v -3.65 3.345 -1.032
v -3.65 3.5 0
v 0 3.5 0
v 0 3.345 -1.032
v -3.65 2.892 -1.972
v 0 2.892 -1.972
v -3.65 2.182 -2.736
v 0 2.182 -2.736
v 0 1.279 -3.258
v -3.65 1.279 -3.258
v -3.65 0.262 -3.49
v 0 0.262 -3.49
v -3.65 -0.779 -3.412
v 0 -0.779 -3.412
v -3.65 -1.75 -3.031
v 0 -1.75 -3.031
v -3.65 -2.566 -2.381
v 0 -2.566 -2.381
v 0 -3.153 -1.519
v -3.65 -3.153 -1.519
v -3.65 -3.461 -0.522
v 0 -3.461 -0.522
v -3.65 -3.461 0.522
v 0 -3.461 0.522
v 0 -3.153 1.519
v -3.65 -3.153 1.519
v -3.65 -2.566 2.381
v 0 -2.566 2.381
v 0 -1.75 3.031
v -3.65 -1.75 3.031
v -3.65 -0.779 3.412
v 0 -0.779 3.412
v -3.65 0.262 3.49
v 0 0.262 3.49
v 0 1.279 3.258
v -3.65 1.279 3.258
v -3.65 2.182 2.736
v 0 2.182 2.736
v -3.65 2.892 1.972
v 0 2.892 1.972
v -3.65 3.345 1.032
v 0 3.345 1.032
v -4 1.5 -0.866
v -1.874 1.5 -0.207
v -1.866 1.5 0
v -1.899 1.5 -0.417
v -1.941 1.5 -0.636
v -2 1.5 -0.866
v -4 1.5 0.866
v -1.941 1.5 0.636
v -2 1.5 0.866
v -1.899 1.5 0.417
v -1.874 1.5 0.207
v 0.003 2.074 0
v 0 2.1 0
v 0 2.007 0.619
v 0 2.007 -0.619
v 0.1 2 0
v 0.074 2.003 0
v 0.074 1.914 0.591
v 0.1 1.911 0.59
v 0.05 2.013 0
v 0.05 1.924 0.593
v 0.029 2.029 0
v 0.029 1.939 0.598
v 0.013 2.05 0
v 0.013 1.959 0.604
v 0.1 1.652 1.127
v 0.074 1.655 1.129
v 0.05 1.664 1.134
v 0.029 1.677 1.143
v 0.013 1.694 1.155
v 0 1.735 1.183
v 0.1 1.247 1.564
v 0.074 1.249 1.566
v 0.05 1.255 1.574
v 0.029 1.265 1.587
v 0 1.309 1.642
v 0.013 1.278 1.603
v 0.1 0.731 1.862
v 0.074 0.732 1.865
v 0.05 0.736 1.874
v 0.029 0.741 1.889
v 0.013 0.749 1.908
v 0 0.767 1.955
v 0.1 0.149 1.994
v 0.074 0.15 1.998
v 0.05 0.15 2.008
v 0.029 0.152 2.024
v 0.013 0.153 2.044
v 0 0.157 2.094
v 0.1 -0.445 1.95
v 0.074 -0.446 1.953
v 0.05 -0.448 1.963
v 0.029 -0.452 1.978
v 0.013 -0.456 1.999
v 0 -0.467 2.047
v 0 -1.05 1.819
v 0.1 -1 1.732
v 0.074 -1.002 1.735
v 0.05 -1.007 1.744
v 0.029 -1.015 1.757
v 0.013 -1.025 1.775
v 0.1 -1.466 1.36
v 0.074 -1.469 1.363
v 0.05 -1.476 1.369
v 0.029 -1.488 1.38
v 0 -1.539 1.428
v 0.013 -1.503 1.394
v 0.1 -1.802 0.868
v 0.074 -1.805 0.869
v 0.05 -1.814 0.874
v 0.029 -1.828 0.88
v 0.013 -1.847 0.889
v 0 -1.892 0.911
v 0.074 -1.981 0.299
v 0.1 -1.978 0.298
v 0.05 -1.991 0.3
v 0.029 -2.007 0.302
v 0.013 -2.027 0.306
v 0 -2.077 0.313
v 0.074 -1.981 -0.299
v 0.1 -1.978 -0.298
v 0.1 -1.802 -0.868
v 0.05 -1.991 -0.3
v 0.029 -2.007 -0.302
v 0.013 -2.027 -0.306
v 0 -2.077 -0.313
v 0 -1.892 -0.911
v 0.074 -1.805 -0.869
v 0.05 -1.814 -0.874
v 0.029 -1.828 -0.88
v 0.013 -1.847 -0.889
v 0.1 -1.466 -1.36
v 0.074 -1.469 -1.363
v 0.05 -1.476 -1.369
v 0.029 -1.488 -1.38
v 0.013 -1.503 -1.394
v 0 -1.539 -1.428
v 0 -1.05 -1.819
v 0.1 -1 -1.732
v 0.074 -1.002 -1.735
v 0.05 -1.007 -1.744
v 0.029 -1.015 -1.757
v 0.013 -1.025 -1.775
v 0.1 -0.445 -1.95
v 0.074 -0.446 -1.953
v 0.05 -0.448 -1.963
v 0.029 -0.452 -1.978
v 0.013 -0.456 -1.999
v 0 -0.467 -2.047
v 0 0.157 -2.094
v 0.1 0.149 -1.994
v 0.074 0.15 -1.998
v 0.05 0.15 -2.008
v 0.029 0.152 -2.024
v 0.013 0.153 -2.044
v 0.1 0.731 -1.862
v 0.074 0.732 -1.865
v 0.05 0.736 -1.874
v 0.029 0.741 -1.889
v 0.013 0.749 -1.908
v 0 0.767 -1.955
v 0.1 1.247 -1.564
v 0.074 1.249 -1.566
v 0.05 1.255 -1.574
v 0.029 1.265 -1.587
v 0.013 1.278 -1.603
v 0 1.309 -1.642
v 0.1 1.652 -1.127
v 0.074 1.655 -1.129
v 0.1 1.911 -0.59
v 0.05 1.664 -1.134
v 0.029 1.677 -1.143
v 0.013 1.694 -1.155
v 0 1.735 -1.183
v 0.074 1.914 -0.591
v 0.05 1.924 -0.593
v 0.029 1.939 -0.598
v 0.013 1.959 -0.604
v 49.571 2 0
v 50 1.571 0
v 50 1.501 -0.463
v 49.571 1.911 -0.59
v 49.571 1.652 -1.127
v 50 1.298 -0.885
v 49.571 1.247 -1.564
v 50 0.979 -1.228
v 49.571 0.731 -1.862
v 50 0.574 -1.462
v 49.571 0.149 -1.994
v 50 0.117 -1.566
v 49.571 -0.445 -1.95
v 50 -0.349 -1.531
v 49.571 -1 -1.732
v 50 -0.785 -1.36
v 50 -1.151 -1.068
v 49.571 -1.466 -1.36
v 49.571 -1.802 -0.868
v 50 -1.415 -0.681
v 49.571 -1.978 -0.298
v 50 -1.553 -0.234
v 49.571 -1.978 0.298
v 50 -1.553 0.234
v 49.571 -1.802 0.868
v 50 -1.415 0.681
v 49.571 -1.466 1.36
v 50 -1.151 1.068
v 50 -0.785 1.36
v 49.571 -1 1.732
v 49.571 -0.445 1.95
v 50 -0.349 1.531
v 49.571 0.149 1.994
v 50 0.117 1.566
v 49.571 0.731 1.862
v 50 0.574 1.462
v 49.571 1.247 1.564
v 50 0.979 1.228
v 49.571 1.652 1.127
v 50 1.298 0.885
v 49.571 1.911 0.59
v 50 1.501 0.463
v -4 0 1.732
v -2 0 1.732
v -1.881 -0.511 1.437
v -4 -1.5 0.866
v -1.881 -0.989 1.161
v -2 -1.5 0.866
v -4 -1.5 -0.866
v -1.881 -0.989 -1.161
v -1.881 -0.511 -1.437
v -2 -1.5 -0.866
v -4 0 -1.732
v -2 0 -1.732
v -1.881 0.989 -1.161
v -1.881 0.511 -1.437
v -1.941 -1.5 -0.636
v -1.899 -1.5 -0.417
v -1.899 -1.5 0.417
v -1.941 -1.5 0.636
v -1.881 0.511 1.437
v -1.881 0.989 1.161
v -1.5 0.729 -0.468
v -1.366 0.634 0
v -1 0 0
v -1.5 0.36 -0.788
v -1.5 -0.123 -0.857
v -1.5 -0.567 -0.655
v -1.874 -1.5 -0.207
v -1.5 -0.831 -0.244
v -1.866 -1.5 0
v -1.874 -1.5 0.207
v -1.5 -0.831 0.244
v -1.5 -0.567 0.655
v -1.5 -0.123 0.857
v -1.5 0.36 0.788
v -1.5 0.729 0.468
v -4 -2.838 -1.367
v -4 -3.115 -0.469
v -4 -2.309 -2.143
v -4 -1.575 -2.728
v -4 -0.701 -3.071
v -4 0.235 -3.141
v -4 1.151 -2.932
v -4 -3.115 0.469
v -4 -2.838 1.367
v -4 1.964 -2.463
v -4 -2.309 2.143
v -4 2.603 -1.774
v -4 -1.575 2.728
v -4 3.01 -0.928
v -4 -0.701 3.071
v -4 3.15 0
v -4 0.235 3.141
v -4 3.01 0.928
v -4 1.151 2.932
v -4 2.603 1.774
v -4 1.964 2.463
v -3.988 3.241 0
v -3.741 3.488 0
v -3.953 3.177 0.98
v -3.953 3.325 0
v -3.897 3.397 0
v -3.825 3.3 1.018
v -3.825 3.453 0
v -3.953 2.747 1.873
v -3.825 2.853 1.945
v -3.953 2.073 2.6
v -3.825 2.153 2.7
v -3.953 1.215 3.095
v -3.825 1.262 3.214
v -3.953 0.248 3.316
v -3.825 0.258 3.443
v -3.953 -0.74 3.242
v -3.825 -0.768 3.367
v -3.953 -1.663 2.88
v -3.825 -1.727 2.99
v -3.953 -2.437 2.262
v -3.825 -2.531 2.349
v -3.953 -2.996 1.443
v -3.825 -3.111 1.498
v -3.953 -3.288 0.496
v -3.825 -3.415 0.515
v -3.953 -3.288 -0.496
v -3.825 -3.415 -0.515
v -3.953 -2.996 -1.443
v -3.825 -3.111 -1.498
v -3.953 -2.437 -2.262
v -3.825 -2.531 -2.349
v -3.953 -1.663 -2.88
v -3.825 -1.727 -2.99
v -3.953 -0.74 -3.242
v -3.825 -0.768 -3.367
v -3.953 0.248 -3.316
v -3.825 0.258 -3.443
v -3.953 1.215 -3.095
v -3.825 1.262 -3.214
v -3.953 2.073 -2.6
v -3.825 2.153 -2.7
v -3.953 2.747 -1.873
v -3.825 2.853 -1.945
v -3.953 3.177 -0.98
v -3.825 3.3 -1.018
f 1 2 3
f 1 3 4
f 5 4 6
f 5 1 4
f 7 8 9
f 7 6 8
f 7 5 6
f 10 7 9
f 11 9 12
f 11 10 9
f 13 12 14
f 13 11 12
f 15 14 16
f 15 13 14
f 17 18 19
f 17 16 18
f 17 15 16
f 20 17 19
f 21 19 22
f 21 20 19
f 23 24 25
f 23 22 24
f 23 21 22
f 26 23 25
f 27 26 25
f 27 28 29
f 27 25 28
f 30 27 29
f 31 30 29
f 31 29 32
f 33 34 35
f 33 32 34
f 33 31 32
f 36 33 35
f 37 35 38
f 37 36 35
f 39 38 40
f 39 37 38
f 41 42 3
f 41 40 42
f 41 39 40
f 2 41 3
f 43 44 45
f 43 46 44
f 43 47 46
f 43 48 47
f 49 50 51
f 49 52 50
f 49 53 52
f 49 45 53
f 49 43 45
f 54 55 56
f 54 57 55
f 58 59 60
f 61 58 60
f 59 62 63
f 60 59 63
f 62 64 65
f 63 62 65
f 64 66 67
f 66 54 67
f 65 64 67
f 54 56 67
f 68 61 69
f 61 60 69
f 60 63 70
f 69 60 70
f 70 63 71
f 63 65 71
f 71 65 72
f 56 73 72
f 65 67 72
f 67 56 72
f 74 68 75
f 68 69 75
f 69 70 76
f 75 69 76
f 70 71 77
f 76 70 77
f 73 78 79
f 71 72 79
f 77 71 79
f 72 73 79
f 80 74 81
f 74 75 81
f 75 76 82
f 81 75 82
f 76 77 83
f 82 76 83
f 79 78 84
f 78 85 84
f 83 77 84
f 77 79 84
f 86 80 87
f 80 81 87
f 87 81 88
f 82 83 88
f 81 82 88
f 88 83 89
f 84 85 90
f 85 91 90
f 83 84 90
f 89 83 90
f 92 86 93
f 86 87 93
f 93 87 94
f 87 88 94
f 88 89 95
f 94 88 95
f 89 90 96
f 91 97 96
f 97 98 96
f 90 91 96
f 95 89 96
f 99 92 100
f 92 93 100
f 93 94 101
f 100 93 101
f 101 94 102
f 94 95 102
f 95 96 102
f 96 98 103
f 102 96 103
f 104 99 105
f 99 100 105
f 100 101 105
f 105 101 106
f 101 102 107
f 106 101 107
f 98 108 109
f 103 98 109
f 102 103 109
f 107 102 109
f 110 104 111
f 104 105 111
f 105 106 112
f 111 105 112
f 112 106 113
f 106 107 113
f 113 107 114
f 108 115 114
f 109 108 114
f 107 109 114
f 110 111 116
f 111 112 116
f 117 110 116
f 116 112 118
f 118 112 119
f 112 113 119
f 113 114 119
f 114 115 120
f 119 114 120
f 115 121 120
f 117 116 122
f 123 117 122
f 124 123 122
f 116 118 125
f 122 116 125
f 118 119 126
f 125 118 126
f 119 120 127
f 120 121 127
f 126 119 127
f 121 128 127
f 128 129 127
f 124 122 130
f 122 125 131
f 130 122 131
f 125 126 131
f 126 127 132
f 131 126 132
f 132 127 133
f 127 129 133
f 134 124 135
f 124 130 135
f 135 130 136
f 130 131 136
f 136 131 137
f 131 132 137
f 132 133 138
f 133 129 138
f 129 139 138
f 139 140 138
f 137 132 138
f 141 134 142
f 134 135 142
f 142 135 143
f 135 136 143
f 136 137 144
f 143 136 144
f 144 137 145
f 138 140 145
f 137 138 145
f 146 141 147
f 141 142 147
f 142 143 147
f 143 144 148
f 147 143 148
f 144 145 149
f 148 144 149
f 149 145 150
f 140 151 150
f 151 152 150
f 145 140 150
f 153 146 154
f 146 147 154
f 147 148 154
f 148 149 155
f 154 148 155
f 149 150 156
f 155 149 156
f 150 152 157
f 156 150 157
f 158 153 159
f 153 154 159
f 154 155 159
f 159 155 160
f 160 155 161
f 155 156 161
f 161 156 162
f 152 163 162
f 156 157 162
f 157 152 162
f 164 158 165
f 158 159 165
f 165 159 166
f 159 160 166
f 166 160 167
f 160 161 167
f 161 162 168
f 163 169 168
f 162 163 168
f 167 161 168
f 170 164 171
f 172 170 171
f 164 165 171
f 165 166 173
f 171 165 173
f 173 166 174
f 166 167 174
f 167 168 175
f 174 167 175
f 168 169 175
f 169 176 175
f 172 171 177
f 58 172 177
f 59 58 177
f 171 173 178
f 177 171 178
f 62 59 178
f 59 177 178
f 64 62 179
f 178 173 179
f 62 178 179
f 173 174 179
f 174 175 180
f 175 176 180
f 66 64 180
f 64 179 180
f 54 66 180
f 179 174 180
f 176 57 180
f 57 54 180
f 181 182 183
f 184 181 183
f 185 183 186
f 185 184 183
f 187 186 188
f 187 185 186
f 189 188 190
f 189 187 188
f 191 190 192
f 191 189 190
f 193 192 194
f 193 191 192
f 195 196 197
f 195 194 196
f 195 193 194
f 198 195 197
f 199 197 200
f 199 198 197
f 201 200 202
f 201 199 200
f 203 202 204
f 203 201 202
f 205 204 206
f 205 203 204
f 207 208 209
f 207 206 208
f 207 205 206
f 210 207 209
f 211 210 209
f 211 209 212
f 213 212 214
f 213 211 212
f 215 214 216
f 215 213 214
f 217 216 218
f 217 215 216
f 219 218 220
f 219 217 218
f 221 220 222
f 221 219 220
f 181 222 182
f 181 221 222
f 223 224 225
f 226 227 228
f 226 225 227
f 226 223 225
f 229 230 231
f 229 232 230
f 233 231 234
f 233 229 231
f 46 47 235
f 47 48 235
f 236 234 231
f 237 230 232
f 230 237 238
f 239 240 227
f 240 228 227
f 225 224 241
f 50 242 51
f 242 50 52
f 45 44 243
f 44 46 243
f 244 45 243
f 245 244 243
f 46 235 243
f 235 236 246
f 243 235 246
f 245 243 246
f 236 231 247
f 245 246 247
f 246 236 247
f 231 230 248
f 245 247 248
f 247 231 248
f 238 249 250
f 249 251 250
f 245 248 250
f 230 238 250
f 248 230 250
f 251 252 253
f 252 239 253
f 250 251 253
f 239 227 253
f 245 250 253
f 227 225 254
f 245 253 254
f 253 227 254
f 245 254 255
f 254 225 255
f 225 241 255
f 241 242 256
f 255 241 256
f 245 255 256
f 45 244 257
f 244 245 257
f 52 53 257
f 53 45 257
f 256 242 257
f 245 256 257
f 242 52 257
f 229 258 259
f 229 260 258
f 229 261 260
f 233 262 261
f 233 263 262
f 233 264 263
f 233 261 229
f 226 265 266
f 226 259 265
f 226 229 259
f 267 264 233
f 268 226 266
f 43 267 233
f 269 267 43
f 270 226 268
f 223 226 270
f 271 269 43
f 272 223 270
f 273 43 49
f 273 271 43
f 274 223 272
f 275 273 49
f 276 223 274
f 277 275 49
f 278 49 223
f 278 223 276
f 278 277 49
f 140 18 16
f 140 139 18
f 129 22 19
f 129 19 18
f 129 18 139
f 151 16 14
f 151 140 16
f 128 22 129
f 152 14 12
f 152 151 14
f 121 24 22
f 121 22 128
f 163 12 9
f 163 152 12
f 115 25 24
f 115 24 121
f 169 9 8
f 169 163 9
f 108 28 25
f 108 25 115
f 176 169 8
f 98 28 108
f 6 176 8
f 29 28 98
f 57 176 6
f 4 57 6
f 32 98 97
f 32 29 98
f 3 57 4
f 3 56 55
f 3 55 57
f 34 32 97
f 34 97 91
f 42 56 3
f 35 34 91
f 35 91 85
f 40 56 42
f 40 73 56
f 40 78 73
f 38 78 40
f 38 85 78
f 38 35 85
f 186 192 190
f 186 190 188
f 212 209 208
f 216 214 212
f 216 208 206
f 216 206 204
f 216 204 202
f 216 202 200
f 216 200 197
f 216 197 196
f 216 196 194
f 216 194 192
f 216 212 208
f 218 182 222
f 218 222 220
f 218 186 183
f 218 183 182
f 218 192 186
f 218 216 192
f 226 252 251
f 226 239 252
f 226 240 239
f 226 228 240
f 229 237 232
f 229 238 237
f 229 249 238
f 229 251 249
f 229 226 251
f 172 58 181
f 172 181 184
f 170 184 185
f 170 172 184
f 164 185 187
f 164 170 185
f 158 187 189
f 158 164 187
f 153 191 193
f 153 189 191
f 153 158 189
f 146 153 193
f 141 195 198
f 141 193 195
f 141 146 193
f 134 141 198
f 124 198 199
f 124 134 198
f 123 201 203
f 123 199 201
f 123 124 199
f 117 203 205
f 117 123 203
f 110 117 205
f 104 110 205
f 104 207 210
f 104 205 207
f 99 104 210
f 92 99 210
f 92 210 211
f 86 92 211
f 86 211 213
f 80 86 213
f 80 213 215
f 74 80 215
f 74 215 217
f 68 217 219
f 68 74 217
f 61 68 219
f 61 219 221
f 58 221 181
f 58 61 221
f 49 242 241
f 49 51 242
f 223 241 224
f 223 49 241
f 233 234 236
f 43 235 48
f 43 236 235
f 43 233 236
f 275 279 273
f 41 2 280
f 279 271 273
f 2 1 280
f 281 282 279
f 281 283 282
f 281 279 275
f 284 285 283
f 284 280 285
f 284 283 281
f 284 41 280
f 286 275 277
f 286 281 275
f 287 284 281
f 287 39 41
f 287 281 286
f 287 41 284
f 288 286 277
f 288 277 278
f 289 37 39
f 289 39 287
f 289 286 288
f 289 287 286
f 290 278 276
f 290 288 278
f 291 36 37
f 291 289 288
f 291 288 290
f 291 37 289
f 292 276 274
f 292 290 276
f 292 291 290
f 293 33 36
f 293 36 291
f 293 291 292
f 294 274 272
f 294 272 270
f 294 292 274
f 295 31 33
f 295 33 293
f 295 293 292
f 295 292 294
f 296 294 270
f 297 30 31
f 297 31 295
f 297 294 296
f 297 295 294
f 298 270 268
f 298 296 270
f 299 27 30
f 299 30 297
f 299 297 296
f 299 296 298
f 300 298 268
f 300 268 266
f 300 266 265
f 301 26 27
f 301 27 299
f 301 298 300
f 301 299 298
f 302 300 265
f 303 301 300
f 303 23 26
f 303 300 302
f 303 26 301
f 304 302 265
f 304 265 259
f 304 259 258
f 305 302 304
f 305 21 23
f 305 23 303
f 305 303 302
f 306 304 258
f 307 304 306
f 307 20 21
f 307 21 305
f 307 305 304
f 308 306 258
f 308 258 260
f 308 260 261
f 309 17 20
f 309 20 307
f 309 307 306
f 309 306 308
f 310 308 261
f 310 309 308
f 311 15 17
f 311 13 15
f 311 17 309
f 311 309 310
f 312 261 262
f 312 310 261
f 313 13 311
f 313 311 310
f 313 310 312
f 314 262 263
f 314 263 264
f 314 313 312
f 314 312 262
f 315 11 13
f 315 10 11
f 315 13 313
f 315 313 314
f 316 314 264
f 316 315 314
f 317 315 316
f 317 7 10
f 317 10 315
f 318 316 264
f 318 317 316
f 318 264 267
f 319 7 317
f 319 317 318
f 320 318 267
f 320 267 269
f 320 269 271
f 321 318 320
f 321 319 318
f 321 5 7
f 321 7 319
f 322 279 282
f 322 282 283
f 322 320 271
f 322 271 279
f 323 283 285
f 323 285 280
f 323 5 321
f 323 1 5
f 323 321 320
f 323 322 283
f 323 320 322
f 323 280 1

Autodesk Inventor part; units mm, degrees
ref_plane "YZ Plane" through (0, 0, 0) normal (1, 0, 0) x (0, 1, 0)
ref_plane "XZ Plane" through (0, 0, 0) normal (0, 1, 0) x (-1, 0, 0)
sketch "Sketch1" plane through (0, 0, 0) normal (0, 0, 1) x (1, 0, 0)
  line L0 (-1, 0) -> (50, 0)
  line L1 (50, 0) -> (50, 2)
  line L2 (50, 2) -> (30, 2)
  line L3 (30, 2) -> (29.5705, 2)
  line L4 (29.5705, 2) -> (0, 2)
  line L5 (0, 2) -> (0, 3.5)
  line L6 (0, 3.5) -> (-4, 3.5)
  line L7 (-4, 3.5) -> (-4, 1.7321)
  line L8 (-4, 1.7321) -> (-2, 1.7321)
  line L9 (-2, 1.7321) -> (-1, 0)
  line L10 (-14.8, 0) -> (60.8, 0) projected
  line L11 (0, -0.7) -> (0, 4.2) projected
  line L12 (30, 2) -> (0, 2) construction
  dimension "d1" = 20
  dimension "d2" = 0.4295
  dimension "d3" = 4
  dimension "d4" = 2
  dimension "d5" = 60
  dimension "d6" = 4
  dimension "d7" = 4
  dimension "d8" = 3.4641
  dimension "d9" = 7
  dimension "d26" = 50
revolve "Body" add sketch "Sketch1" angle 360 about axis through (-1, 0, 0) along (1, 0, 0)
sketch "Sketch2" plane through (-4, 0, 0) normal (-1, 0, 0) x (0, 0, 1)
  circle A0 centre (0, 0) radius 1.7321 projected
  line L0 (0, -4.9) -> (0, 4.9) projected
  line L1 (-4.9, 0) -> (4.9, 0) projected
  line L2 (1.7321, 0) -> (0.866, -1.5)
  line L3 (0.866, -1.5) -> (-0.866, -1.5)
  line L4 (-0.866, -1.5) -> (-1.7321, 0)
  line L5 (-1.7321, 0) -> (-0.866, 1.5)
  line L6 (-0.866, 1.5) -> (0.866, 1.5)
  line L7 (0.866, 1.5) -> (1.7321, 0)
extrude "Slot" add sketch "Sketch2" against normal up to next contours L7 A0 | A0 L2 | L6 L0 A0 | A0 L0 L3 | L0 L6 A0 | A0 L3 L0 | L4 A0 | A0 L5
fillet "Fillet1" radius 0.35 1 edges at (-4, -3.5, 0)
thread "Thread" size "M4x0.7" class "6g" standard "ISO Metric profile" length 20
chamfer "Chamfer1" distance 0.4294 distance2 0.4294 1 edges at (50, -2, 0) measured on face at (50, -0.8158, 0.4805)
ref_plane "Work Plane1" through (29, 0, 0) normal (0, -1, 0) x (1, 0, 0)
fillet "Fillet2" radius 0.1 1 edges at (0, -2, 0)
equation "\"d1\" = GEL"
equation "\"d3\" = KOH"
equation "\"d4\" = INTI"
equation "\"d6\" = GD"
equation "\"d7\" = BDM"
equation "\"d8\" = 1.1547 * SW"
equation "\"d9\" = KOD"
equation "\"d26\" = NLG"
equation "\"d30\" = R"
equation "\"d17\" = RR"
equation "\"d13\" = GEL"
equation "\"d15\" = -0.5 * SPD + 0.5 * GD"
equation "\"d16\" = GUL"
equation "\"GD\" = NND"
equation "\"NLG\" = 50"
equation "\"GEL\" = 20"
equation "\"KOD\" = 7"
equation "\"KOH\" = NND"
equation "\"INTI\" = 2"
equation "\"GAL\" = 0.61345 * PTC"
equation "\"GUL\" = 0.61345 * PTC"
equation "\"BDM\" = NND"
equation "\"SW\" = 3"
equation "\"RR\" = 0.35"
equation "\"SPD\" = NND - 1.2269 * PTC"
equation "\"R\" = 0.1"
equation "\"PHH\" = 0.1 * NND"
equation "\"GD1\" = THREADDIA - 1.2269 * PTC"
equation "\"THREADDIA\" = 4"
equation "\"FAWI\" = 45deg"
equation "\"PTC\" = 0.7"
equation "\"NND\" = 4"
equation "\"FAWI1\" = 30deg"
equation "\"TOA\" = 30deg"
equation "\"E0\" = 1.155 * SW"
properties part number "Unbrako - M4 x 50" material "Steel, Mild"
